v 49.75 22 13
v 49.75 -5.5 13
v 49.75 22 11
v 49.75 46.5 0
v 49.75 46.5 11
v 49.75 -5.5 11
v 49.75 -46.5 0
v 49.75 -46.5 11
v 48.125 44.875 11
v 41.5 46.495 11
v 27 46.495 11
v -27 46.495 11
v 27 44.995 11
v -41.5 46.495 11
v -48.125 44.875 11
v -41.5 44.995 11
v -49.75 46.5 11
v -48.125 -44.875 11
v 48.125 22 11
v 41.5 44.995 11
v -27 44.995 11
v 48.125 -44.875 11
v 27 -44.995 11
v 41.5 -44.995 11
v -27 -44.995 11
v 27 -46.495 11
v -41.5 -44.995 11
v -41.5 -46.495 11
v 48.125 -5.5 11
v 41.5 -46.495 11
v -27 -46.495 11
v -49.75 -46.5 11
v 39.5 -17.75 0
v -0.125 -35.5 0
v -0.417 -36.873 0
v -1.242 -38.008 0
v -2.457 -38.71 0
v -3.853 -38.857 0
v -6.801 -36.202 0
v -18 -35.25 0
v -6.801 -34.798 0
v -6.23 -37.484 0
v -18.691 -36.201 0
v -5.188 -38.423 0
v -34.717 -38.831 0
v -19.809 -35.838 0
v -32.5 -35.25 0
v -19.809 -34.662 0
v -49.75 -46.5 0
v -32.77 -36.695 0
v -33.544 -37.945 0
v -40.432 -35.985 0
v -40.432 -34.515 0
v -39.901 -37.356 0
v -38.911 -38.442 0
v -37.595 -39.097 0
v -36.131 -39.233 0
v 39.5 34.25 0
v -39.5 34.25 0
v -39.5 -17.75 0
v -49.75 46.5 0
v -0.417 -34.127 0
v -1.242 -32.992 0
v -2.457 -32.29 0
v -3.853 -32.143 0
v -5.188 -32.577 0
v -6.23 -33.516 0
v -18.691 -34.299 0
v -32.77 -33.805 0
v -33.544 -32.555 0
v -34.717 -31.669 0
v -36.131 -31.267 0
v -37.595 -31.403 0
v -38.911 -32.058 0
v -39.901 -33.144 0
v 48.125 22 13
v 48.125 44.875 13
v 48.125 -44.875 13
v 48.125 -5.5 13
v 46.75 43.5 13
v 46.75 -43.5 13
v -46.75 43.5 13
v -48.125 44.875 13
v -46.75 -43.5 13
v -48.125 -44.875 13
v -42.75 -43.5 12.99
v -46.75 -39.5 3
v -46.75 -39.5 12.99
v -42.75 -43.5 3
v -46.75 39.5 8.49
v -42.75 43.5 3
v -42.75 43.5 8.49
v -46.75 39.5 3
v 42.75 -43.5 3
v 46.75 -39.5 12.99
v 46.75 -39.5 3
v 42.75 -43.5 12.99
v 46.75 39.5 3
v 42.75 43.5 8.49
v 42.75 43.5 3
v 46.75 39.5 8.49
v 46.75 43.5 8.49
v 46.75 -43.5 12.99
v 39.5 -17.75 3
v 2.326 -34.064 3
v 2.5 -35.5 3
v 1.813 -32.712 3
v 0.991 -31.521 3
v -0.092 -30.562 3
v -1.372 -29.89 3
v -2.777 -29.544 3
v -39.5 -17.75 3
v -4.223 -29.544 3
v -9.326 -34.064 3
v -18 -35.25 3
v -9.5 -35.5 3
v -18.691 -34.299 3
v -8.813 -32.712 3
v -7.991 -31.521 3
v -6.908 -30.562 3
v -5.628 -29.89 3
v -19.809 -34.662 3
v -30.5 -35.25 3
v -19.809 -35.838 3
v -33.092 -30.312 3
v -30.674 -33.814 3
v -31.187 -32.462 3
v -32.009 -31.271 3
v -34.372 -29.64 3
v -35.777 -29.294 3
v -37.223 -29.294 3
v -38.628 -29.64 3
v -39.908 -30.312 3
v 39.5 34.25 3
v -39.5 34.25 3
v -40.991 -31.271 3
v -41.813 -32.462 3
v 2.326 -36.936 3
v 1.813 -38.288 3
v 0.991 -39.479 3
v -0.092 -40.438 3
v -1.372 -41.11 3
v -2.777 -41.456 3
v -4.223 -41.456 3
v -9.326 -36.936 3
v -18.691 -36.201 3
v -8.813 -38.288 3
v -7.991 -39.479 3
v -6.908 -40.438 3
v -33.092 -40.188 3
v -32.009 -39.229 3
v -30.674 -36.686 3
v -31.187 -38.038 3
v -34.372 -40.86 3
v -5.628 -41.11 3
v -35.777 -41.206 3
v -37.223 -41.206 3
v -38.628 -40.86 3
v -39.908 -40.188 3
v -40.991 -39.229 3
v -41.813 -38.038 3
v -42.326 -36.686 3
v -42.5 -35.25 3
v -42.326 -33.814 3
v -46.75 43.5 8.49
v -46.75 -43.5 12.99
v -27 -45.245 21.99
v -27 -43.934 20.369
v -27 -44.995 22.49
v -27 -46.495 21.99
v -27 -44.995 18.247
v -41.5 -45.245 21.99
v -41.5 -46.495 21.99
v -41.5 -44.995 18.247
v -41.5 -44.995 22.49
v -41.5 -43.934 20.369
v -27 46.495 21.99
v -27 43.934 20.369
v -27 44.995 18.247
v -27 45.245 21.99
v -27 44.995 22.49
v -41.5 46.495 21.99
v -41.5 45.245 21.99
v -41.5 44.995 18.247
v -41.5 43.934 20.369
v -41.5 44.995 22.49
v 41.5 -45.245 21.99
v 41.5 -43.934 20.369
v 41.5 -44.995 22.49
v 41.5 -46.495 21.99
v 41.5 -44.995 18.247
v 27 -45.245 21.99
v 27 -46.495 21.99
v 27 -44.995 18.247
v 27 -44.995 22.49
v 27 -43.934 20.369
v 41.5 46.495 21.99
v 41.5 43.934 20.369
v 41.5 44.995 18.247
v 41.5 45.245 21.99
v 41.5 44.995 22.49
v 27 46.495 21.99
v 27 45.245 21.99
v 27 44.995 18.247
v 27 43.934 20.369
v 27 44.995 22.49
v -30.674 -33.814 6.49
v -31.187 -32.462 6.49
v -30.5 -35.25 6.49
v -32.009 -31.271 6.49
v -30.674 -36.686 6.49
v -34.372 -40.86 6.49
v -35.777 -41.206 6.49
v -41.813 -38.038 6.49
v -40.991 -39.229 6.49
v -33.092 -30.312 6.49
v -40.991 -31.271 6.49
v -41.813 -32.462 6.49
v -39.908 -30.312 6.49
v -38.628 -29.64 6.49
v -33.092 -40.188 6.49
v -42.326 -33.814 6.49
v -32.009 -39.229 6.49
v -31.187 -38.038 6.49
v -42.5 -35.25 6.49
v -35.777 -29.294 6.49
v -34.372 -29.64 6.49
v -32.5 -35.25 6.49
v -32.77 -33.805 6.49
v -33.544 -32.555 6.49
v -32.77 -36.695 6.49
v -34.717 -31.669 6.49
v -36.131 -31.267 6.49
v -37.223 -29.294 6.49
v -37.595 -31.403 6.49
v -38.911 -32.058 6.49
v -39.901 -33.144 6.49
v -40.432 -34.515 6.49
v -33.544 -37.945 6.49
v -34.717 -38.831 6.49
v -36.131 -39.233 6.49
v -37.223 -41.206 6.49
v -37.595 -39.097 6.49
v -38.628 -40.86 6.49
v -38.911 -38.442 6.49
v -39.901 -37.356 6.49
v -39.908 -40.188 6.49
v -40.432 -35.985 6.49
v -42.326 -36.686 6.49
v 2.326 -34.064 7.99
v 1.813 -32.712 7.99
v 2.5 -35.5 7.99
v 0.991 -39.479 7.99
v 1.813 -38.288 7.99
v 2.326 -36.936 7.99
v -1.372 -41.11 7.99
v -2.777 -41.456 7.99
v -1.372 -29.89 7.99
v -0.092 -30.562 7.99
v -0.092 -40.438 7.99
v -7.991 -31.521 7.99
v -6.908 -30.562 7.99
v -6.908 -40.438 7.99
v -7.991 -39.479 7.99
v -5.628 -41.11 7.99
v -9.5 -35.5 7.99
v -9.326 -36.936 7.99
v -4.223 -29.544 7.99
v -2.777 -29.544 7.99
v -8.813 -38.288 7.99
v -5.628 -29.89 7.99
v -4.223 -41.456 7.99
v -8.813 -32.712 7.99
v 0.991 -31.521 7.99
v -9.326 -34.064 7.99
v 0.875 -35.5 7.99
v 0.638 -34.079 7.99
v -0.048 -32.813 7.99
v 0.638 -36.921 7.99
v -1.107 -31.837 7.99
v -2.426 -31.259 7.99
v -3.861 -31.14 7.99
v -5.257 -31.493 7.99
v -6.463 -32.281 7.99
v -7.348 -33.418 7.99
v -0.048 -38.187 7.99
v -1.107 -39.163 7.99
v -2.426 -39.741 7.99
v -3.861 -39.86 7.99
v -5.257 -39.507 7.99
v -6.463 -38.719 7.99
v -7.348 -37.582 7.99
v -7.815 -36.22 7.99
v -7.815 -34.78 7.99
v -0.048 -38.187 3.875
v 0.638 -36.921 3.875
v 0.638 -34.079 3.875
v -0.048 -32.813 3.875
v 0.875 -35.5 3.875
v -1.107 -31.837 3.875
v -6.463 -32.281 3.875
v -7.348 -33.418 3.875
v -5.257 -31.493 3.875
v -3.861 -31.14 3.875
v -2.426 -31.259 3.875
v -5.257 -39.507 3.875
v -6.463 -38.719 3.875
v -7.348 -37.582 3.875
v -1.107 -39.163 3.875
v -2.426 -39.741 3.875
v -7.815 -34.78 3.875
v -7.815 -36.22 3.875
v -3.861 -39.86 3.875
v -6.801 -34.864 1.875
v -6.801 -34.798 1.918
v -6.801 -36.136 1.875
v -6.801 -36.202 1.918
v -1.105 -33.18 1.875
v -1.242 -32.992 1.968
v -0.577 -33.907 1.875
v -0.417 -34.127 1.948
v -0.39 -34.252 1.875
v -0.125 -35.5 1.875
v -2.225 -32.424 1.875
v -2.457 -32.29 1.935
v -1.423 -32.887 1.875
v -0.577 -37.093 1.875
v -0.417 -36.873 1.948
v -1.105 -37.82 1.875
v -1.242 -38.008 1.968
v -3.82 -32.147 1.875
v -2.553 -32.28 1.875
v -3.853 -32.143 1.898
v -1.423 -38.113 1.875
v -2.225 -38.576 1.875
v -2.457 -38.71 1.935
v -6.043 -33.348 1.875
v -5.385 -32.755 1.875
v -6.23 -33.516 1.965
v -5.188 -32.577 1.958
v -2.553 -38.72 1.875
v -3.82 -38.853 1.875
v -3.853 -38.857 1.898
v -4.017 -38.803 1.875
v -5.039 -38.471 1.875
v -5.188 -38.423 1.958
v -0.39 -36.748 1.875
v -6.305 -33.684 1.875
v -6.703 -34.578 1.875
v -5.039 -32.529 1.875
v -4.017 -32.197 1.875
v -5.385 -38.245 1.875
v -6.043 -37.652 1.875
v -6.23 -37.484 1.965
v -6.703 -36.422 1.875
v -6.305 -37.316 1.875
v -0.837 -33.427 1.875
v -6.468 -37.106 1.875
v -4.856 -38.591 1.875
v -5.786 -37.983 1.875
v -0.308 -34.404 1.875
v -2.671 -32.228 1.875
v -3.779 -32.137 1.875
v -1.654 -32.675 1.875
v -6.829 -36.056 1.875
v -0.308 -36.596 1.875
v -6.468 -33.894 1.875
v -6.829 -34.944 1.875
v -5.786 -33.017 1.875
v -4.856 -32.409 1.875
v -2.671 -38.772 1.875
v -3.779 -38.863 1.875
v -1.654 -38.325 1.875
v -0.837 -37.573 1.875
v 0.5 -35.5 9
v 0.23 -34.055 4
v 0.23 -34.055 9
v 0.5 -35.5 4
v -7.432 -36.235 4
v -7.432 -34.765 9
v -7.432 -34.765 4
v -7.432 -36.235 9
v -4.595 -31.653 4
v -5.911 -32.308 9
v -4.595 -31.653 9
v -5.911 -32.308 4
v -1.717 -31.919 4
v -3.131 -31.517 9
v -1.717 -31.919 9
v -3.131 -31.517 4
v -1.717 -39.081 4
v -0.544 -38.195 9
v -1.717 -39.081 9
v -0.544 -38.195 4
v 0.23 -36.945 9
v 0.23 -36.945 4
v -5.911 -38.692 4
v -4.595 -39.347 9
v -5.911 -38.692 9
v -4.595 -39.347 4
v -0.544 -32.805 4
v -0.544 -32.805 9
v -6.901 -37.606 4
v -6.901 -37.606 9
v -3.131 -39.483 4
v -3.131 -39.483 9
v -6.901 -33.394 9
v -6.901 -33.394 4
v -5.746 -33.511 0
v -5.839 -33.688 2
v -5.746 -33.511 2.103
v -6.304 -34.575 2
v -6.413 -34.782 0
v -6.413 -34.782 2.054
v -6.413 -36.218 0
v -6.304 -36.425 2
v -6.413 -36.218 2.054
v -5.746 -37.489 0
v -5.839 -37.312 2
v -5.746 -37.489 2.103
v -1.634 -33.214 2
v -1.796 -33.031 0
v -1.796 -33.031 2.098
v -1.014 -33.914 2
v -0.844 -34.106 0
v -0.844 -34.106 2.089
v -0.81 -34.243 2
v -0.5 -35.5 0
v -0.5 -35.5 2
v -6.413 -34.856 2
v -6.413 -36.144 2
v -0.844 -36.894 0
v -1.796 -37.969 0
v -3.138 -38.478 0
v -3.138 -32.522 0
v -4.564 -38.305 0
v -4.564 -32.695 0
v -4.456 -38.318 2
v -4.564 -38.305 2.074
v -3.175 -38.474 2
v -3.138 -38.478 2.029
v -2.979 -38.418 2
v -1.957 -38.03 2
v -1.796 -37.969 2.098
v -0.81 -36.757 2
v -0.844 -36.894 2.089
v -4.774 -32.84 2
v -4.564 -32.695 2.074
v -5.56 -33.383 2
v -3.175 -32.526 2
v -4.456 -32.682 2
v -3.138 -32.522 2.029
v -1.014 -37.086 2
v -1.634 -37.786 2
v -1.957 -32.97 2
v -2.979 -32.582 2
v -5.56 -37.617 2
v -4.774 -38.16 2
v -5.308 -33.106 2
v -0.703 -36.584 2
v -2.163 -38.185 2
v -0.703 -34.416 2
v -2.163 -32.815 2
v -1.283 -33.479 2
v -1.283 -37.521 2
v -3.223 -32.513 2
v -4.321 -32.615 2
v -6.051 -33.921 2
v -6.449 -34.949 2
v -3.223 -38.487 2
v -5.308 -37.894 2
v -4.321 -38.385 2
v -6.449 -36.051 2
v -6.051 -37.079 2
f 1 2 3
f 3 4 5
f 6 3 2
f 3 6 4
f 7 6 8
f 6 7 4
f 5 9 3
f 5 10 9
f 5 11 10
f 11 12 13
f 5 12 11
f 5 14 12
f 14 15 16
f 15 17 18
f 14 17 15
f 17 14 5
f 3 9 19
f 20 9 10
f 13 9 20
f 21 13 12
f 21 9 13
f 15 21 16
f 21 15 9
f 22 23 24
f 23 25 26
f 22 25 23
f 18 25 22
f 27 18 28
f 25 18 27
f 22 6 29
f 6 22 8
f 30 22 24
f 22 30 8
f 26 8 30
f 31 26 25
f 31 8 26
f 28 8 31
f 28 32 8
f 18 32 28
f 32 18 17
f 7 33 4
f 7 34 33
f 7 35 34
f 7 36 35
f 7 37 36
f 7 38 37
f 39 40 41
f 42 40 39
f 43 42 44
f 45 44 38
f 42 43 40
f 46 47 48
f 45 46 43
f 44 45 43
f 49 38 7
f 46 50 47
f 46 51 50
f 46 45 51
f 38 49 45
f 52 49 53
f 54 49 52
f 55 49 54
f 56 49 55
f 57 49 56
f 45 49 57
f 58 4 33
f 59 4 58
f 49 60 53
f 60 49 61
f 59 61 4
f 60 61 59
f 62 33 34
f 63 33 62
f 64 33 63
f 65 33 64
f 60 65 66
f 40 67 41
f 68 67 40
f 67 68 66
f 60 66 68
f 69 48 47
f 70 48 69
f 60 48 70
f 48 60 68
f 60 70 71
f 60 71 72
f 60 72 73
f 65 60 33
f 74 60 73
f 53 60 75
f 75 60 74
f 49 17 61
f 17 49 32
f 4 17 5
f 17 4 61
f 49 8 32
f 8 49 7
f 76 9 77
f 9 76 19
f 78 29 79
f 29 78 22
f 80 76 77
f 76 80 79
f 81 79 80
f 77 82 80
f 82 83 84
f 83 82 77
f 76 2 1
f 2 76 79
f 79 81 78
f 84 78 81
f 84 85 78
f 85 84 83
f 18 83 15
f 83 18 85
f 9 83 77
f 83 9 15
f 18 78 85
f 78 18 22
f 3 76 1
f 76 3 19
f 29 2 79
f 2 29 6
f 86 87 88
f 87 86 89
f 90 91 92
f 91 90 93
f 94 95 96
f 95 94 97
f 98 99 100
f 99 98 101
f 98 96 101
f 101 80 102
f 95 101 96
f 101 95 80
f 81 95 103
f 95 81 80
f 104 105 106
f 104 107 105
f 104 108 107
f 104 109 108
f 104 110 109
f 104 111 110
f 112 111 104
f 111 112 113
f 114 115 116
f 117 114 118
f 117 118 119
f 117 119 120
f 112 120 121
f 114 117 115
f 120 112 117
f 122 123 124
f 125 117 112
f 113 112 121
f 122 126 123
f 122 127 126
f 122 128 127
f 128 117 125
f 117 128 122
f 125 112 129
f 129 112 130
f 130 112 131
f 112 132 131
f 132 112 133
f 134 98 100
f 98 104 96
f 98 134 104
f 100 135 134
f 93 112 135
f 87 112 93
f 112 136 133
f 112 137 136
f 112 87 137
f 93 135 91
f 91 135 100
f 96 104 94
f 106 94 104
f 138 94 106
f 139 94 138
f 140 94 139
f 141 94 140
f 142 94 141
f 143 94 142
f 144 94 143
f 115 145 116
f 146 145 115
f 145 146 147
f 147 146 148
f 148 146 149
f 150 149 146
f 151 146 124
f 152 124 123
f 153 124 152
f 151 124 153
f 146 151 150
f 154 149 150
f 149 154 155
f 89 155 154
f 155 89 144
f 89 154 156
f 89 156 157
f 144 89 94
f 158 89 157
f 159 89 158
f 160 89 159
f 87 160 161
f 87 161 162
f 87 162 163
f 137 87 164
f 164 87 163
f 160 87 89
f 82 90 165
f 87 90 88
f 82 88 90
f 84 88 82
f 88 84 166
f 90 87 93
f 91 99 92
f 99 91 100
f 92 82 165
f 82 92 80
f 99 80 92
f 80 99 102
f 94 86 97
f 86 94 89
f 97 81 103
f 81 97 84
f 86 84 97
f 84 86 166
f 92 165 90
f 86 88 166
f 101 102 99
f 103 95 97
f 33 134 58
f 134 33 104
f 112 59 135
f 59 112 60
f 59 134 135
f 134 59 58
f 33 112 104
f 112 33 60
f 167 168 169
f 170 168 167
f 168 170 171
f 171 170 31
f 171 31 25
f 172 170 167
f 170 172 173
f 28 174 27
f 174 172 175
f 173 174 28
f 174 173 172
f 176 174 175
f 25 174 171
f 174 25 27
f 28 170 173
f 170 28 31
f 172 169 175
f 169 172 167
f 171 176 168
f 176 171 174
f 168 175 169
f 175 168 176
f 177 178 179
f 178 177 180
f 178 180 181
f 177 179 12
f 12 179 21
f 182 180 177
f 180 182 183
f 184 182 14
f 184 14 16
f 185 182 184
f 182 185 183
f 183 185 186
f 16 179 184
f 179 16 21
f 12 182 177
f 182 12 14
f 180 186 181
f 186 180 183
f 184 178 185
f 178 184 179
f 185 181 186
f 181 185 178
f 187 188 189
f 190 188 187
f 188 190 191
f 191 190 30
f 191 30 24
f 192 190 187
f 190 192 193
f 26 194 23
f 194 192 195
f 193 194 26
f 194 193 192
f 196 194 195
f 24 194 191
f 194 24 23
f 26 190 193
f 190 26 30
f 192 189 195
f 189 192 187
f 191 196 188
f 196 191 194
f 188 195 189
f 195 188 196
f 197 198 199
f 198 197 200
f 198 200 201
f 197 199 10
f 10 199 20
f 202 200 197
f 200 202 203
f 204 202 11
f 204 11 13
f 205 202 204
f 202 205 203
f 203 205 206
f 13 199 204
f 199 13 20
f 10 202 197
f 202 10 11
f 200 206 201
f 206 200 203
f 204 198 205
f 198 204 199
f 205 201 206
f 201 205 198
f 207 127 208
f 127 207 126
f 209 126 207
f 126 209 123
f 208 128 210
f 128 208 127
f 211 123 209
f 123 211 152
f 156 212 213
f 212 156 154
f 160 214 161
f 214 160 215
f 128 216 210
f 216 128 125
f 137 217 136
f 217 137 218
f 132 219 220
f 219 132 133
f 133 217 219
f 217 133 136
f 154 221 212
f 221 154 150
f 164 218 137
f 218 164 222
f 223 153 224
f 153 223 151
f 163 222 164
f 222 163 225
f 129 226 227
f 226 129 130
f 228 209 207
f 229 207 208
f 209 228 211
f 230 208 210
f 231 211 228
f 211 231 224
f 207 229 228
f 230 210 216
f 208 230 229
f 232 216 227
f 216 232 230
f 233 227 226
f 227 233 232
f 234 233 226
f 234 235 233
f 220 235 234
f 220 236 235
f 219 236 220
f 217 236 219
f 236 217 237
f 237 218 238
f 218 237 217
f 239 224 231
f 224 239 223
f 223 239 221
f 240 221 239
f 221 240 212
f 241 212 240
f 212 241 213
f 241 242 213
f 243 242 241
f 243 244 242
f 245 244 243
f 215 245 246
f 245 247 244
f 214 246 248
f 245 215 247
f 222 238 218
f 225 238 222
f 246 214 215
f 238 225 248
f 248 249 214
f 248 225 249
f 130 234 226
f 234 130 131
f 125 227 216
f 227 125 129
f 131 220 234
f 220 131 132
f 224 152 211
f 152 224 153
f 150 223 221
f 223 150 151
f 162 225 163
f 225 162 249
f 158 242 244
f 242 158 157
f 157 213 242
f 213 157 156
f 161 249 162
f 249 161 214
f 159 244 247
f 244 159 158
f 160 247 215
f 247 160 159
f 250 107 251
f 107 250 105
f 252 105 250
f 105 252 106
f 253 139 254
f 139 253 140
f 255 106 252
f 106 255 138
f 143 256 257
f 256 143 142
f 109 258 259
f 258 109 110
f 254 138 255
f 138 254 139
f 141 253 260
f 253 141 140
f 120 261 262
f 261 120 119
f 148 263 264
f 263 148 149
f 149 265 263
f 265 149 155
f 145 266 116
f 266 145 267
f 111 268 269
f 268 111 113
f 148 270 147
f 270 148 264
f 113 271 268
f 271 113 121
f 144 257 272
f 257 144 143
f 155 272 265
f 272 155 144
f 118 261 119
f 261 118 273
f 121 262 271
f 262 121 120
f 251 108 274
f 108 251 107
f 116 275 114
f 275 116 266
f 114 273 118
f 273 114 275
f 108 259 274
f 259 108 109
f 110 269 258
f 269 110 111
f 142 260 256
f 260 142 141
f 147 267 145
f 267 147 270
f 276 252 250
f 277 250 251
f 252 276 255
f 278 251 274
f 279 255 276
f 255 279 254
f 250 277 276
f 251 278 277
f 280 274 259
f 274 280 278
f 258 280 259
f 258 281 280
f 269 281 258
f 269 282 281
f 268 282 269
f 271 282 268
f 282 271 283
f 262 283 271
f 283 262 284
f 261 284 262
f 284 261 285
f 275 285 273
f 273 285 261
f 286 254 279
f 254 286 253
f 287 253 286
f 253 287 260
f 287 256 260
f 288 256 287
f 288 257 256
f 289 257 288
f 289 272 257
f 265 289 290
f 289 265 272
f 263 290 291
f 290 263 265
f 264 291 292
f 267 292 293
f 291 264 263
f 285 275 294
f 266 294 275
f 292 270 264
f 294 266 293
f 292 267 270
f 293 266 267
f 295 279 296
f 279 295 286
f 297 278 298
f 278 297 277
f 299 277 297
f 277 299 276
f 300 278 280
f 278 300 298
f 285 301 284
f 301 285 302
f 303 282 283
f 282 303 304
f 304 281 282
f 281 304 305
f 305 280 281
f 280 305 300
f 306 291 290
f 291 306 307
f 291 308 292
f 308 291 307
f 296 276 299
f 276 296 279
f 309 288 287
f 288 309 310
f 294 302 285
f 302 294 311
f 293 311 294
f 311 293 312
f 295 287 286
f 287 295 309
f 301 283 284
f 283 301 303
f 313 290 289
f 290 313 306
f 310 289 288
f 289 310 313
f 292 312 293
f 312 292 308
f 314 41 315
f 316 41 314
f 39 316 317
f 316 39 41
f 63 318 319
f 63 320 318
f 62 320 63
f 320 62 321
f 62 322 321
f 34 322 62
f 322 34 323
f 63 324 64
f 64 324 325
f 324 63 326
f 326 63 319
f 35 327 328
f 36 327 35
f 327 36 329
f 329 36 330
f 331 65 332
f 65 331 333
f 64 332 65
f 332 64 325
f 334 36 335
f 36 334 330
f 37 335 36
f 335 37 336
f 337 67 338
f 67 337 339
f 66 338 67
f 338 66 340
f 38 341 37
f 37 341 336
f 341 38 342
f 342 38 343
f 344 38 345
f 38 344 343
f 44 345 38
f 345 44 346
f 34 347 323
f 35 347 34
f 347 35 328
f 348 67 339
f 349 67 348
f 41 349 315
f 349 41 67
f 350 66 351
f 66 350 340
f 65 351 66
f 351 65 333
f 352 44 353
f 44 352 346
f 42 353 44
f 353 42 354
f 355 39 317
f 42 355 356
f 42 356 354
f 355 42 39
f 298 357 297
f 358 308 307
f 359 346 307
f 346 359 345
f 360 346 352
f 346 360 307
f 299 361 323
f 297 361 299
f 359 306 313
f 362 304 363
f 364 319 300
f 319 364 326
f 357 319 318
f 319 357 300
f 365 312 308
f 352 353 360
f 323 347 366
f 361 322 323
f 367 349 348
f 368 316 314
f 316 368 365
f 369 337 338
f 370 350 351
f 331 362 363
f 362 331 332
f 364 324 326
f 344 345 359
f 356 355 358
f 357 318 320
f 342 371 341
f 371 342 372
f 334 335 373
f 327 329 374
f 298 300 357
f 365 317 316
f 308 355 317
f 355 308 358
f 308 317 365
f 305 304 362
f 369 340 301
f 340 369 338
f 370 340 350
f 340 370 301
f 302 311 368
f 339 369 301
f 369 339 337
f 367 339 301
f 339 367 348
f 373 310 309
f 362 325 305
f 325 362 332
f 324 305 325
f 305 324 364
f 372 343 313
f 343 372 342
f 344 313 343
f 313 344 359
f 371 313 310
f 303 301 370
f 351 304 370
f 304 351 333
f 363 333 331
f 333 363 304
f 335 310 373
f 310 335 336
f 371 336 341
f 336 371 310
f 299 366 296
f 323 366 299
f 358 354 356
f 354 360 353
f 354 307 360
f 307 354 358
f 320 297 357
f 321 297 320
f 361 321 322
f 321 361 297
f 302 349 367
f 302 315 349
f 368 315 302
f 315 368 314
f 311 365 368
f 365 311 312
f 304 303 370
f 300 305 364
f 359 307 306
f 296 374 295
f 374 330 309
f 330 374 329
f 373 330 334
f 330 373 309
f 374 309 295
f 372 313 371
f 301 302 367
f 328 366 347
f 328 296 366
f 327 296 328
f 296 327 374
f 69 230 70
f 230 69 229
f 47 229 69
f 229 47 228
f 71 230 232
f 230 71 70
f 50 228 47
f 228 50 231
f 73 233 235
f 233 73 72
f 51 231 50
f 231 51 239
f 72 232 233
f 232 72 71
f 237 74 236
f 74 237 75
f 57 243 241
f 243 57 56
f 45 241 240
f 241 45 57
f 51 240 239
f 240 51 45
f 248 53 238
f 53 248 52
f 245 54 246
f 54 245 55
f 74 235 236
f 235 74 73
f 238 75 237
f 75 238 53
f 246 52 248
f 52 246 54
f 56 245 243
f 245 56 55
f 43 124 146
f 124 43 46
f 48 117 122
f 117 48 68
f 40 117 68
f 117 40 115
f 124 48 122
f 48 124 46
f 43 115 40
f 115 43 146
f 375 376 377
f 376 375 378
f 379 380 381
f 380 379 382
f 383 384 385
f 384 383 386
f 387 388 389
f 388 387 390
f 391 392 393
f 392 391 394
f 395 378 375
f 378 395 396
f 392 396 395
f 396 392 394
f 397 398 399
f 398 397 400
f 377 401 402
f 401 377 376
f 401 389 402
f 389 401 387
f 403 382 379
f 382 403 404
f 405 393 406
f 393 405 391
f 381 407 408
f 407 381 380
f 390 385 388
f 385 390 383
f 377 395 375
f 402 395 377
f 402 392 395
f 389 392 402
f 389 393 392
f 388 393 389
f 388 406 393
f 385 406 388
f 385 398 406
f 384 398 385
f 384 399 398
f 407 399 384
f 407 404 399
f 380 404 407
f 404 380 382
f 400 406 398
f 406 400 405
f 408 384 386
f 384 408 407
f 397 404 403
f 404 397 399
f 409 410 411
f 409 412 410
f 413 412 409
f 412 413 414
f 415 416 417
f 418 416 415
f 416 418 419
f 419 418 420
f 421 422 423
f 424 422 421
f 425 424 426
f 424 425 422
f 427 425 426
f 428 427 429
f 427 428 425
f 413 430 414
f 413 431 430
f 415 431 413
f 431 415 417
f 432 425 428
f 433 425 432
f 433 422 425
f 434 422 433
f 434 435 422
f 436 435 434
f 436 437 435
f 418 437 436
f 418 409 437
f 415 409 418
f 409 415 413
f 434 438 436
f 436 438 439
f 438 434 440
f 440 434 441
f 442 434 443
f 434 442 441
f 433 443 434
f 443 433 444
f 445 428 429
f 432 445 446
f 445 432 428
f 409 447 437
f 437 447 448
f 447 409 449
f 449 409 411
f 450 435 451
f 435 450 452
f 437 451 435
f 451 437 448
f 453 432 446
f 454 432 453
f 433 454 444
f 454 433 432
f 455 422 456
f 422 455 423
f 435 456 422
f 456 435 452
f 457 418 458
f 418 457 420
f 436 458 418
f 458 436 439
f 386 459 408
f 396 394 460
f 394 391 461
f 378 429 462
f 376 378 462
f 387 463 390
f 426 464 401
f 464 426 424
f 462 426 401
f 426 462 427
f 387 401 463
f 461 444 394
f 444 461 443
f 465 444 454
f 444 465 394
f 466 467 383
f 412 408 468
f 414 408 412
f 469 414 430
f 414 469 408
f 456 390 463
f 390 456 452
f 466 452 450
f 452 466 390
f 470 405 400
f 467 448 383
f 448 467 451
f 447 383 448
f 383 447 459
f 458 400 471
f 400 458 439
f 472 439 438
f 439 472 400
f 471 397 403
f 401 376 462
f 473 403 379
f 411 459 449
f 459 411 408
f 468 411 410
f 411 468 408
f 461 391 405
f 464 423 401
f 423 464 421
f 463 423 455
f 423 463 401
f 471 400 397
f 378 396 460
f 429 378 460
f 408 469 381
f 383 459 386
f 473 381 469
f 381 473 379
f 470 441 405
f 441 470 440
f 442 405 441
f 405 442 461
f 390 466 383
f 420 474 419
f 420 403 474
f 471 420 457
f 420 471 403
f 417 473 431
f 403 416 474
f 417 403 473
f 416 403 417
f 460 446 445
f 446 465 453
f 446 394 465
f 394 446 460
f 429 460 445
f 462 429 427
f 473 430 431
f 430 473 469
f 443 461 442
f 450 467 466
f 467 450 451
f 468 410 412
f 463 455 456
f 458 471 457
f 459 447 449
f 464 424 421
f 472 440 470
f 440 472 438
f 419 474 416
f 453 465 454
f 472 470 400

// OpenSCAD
include <config.scad>
use <GDMUtils.scad>
use <joiners.scad>
use <rrd_graphic_lcd_case.scad>


module rrd_graphic_lcd_cover_parts() { // make me
	rrd_graphic_lcd_case_top();
}


rrd_graphic_lcd_cover_parts();


// vim: noexpandtab tabstop=4 shiftwidth=4 softtabstop=4 nowrap
